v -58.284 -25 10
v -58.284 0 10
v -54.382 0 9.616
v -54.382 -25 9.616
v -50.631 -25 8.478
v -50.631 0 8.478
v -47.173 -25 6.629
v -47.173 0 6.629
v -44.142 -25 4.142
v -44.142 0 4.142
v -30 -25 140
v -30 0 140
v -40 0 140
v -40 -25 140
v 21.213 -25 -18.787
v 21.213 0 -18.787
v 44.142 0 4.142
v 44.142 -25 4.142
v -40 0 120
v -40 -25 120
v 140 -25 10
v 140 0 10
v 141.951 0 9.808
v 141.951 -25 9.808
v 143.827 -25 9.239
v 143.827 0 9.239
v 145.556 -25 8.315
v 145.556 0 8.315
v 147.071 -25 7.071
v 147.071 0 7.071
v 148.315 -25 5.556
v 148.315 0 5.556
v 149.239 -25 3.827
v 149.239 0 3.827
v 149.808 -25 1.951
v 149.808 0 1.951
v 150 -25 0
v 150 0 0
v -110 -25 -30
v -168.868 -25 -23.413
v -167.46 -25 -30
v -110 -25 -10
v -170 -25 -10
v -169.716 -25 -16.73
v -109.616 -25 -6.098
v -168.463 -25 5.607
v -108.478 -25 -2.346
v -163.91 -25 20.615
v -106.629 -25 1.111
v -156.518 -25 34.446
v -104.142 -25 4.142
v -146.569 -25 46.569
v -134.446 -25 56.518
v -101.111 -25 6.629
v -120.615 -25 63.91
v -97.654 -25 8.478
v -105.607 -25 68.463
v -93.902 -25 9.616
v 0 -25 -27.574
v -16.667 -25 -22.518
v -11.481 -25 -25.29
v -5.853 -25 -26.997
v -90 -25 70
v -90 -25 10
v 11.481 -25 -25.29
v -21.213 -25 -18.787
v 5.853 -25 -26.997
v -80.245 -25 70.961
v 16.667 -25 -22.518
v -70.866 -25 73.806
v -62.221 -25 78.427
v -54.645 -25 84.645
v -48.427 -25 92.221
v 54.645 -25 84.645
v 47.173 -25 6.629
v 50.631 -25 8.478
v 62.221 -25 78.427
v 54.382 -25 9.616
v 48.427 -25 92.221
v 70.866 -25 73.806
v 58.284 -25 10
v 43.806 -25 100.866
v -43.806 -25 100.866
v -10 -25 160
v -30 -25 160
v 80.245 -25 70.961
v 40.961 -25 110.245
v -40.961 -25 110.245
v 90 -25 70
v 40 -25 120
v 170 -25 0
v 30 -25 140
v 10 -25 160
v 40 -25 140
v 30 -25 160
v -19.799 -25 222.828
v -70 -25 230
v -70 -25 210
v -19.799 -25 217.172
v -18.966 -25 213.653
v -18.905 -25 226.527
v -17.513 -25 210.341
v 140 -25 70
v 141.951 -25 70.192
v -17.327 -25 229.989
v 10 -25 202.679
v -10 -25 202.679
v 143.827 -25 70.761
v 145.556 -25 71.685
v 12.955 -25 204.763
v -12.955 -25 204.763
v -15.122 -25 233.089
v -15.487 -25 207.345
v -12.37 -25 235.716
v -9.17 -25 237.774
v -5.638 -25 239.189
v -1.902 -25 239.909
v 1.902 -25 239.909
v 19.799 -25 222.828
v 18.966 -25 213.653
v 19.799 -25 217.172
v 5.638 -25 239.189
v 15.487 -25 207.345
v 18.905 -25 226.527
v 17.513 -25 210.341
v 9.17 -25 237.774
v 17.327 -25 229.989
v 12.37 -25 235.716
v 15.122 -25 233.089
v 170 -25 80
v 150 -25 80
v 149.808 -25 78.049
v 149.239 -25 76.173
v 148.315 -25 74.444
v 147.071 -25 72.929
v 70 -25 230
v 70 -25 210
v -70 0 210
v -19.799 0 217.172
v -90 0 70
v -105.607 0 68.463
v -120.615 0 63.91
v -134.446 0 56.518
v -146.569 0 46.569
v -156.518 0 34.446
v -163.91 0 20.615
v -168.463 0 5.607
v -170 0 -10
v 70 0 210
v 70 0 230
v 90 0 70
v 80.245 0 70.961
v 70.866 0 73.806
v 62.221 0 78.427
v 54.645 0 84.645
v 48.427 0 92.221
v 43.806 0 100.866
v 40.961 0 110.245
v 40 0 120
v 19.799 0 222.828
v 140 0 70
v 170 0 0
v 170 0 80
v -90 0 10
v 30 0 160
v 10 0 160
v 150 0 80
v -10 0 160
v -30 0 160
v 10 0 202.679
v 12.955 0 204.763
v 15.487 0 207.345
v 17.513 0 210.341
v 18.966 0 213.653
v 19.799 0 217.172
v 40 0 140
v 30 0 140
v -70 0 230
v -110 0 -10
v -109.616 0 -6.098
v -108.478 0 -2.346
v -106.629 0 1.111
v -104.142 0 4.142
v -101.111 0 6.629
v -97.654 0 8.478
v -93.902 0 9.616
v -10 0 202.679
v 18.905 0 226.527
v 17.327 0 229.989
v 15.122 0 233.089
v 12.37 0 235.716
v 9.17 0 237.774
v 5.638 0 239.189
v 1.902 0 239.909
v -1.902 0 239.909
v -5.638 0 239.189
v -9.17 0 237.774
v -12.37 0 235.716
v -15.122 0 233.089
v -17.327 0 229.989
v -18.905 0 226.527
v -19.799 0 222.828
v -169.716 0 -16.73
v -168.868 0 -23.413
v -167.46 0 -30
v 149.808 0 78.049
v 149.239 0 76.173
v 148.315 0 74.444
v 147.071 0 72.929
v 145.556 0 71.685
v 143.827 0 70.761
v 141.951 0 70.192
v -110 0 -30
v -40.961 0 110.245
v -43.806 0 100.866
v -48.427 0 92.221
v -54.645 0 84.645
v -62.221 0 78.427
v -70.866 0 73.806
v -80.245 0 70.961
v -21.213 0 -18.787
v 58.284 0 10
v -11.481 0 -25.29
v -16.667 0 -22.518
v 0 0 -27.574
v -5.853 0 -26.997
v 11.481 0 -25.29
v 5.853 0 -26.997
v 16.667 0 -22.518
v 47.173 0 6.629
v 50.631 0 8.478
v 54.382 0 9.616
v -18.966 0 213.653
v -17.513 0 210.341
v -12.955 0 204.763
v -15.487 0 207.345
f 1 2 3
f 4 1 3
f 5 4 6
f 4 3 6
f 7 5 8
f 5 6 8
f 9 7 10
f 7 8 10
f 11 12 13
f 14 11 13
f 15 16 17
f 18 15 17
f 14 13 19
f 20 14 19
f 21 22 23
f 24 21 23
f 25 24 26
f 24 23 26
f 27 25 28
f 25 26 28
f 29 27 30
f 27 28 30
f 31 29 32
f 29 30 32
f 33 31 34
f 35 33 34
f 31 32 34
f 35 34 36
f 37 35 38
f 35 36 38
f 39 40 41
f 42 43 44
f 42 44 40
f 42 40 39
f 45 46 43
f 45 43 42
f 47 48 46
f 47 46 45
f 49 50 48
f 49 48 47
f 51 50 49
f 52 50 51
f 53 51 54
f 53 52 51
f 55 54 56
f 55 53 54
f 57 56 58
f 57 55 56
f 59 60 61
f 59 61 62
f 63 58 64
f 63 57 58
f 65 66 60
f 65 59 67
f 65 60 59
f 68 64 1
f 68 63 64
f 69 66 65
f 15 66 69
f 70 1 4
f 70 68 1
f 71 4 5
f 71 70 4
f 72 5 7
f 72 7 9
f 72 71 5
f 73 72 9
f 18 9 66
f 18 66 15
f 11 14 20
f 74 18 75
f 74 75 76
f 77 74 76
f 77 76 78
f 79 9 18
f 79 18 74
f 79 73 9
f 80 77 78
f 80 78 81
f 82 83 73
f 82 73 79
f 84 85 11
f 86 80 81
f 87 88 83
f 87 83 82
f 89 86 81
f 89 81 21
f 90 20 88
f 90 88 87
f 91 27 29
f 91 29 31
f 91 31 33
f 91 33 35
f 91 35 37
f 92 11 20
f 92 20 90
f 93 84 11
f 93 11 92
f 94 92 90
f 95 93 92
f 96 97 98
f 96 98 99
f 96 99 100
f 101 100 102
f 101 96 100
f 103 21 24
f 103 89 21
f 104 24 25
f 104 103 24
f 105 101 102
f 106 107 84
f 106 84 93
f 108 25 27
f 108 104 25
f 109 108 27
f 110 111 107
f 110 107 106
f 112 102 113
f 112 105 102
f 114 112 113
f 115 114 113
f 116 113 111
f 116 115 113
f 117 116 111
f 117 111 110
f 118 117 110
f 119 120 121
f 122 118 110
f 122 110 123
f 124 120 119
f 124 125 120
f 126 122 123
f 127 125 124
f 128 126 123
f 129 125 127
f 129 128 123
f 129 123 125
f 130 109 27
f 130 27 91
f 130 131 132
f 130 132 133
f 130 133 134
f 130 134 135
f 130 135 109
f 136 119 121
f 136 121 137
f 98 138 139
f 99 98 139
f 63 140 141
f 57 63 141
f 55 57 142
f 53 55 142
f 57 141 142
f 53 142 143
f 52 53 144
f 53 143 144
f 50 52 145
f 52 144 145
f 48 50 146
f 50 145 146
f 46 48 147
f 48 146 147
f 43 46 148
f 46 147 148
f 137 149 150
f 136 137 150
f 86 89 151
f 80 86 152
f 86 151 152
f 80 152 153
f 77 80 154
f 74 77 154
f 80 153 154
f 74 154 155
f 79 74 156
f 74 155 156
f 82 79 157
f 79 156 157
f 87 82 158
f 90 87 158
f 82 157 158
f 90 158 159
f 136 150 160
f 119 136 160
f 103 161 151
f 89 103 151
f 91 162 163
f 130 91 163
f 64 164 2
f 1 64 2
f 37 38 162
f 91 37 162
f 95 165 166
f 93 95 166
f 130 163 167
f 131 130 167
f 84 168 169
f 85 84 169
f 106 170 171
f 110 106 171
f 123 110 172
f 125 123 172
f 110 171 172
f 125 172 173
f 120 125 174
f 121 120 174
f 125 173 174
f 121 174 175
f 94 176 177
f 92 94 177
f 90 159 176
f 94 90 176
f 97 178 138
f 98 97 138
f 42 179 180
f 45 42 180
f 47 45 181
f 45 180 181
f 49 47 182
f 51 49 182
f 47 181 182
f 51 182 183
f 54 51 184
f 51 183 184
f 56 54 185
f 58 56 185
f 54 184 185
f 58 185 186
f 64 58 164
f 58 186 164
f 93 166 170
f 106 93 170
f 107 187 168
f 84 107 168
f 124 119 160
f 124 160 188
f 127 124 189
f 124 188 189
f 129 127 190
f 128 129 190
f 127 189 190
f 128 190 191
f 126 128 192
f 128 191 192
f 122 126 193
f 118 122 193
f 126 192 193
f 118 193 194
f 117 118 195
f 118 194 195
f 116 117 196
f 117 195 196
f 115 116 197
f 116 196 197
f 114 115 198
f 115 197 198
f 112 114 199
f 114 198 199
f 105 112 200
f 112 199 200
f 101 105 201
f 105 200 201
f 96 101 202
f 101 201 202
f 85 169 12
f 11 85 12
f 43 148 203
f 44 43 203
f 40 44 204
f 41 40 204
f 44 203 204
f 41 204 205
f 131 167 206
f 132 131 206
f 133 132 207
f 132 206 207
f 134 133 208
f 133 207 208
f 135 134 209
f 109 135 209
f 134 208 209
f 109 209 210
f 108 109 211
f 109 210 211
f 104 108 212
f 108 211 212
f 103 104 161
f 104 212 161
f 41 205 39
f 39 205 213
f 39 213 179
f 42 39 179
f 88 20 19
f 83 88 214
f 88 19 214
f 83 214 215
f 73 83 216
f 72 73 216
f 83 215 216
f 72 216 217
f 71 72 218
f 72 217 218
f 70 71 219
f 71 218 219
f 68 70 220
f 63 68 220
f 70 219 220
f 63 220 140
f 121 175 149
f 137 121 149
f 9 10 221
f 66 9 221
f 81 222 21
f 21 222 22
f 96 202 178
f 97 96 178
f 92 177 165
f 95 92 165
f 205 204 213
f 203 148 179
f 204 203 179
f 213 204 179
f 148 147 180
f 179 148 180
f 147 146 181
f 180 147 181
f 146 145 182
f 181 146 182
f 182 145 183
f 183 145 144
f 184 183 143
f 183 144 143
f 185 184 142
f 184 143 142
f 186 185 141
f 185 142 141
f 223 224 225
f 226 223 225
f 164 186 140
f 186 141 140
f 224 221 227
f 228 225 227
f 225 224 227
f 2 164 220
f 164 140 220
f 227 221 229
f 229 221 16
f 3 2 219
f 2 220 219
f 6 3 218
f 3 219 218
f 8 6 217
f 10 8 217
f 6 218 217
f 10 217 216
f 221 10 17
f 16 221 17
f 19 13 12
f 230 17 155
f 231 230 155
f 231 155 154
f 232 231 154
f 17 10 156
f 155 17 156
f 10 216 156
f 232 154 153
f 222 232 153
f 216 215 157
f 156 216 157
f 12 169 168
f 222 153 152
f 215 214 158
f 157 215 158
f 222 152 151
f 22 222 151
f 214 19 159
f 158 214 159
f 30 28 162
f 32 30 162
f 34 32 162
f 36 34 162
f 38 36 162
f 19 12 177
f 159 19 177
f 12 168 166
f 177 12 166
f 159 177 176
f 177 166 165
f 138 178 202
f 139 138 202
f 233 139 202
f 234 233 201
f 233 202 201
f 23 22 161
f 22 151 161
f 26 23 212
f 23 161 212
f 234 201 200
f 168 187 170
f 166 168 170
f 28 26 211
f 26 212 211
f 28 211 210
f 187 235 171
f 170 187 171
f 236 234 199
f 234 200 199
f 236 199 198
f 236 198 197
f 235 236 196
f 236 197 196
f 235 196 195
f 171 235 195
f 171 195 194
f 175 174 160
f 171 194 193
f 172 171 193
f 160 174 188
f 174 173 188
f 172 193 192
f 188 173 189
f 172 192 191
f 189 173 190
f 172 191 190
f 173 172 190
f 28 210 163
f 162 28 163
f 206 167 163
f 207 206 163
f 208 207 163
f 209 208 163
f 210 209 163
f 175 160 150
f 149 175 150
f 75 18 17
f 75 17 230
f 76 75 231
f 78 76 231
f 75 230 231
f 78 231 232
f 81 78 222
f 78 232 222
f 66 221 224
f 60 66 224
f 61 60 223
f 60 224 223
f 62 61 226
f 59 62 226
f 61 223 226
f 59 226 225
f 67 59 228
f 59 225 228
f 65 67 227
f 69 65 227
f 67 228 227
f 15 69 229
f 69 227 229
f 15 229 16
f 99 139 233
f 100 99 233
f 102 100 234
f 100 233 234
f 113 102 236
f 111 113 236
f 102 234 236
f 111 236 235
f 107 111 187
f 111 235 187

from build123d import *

# Parameters (mm, degrees)
F1_DEPTH = 25


with BuildPart() as f1:
    # F0 (on Front) → F1 (new body)
    with BuildSketch(Plane.XZ):
        with BuildLine():
            Line((-30, 140), (-40, 140))
            Line((-40, 140), (-40, 120))
            ThreePointArc((-40, 120), (-54.644661, 84.644661), (-90, 70))
            ThreePointArc((-90, 70), (-146.568542, 46.568542), (-170, -10))
            ThreePointArc((-170, -10), (-169.362376, -20.080343), (-167.459667, -30))
            Line((-167.459667, -30), (-110, -30))
            Line((-110, -30), (-110, -10))
            ThreePointArc((-110, -10), (-104.142136, 4.142136), (-90, 10))
            Line((-90, 10), (-58.284271, 10))
            ThreePointArc((-58.284271, 10), (-50.630603, 8.477591), (-44.142136, 4.142136))
            Line((-44.142136, 4.142136), (-21.213203, -18.786797))
            ThreePointArc((-21.213203, -18.786797), (0, -27.573593), (21.213203, -18.786797))
            Line((21.213203, -18.786797), (44.142136, 4.142136))
            ThreePointArc((44.142136, 4.142136), (50.630603, 8.477591), (58.284271, 10))
            Line((58.284271, 10), (140, 10))
            ThreePointArc((140, 10), (147.071068, 7.071068), (150, 0))
            Line((150, 0), (170, 0))
            Line((170, 0), (170, 80))
            Line((170, 80), (150, 80))
            ThreePointArc((150, 80), (147.071068, 72.928932), (140, 70))
            Line((140, 70), (90, 70))
            ThreePointArc((90, 70), (54.644661, 84.644661), (40, 120))
            Line((40, 120), (40, 140))
            Line((40, 140), (30, 140))
            Line((30, 140), (-30, 140))
        make_face()
        Polygon((-30, 160), (-30, 140), (30, 140), (30, 160), (10, 160), (-10, 160), align=None)
        with BuildLine():
            Line((-10, 202.679492), (-10, 160))
            Line((-10, 160), (10, 160))
            Line((10, 160), (10, 202.679492))
            ThreePointArc((10, 202.679492), (16.568043, 208.797324), (19.79899, 217.171573))
            ThreePointArc((19.79899, 217.171573), (20, 220), (19.79899, 222.828427))
            ThreePointArc((19.79899, 222.828427), (0, 240), (-19.79899, 222.828427))
            ThreePointArc((-19.79899, 222.828427), (-20, 220), (-19.79899, 217.171573))
            ThreePointArc((-19.79899, 217.171573), (-16.568043, 208.797324), (-10, 202.679492))
        make_face()
        with BuildLine():
            ThreePointArc((19.79899, 222.828427), (20, 220), (19.79899, 217.171573))
            Line((19.79899, 217.171573), (70, 210))
            Line((70, 210), (70, 230))
            Line((70, 230), (19.79899, 222.828427))
        make_face()
        with BuildLine():
            Line((-70, 210), (-19.79899, 217.171573))
            ThreePointArc((-19.79899, 217.171573), (-20, 220), (-19.79899, 222.828427))
            Line((-19.79899, 222.828427), (-70, 230))
            Line((-70, 230), (-70, 210))
        make_face()
    extrude(amount=F1_DEPTH)


solid = f1.part
